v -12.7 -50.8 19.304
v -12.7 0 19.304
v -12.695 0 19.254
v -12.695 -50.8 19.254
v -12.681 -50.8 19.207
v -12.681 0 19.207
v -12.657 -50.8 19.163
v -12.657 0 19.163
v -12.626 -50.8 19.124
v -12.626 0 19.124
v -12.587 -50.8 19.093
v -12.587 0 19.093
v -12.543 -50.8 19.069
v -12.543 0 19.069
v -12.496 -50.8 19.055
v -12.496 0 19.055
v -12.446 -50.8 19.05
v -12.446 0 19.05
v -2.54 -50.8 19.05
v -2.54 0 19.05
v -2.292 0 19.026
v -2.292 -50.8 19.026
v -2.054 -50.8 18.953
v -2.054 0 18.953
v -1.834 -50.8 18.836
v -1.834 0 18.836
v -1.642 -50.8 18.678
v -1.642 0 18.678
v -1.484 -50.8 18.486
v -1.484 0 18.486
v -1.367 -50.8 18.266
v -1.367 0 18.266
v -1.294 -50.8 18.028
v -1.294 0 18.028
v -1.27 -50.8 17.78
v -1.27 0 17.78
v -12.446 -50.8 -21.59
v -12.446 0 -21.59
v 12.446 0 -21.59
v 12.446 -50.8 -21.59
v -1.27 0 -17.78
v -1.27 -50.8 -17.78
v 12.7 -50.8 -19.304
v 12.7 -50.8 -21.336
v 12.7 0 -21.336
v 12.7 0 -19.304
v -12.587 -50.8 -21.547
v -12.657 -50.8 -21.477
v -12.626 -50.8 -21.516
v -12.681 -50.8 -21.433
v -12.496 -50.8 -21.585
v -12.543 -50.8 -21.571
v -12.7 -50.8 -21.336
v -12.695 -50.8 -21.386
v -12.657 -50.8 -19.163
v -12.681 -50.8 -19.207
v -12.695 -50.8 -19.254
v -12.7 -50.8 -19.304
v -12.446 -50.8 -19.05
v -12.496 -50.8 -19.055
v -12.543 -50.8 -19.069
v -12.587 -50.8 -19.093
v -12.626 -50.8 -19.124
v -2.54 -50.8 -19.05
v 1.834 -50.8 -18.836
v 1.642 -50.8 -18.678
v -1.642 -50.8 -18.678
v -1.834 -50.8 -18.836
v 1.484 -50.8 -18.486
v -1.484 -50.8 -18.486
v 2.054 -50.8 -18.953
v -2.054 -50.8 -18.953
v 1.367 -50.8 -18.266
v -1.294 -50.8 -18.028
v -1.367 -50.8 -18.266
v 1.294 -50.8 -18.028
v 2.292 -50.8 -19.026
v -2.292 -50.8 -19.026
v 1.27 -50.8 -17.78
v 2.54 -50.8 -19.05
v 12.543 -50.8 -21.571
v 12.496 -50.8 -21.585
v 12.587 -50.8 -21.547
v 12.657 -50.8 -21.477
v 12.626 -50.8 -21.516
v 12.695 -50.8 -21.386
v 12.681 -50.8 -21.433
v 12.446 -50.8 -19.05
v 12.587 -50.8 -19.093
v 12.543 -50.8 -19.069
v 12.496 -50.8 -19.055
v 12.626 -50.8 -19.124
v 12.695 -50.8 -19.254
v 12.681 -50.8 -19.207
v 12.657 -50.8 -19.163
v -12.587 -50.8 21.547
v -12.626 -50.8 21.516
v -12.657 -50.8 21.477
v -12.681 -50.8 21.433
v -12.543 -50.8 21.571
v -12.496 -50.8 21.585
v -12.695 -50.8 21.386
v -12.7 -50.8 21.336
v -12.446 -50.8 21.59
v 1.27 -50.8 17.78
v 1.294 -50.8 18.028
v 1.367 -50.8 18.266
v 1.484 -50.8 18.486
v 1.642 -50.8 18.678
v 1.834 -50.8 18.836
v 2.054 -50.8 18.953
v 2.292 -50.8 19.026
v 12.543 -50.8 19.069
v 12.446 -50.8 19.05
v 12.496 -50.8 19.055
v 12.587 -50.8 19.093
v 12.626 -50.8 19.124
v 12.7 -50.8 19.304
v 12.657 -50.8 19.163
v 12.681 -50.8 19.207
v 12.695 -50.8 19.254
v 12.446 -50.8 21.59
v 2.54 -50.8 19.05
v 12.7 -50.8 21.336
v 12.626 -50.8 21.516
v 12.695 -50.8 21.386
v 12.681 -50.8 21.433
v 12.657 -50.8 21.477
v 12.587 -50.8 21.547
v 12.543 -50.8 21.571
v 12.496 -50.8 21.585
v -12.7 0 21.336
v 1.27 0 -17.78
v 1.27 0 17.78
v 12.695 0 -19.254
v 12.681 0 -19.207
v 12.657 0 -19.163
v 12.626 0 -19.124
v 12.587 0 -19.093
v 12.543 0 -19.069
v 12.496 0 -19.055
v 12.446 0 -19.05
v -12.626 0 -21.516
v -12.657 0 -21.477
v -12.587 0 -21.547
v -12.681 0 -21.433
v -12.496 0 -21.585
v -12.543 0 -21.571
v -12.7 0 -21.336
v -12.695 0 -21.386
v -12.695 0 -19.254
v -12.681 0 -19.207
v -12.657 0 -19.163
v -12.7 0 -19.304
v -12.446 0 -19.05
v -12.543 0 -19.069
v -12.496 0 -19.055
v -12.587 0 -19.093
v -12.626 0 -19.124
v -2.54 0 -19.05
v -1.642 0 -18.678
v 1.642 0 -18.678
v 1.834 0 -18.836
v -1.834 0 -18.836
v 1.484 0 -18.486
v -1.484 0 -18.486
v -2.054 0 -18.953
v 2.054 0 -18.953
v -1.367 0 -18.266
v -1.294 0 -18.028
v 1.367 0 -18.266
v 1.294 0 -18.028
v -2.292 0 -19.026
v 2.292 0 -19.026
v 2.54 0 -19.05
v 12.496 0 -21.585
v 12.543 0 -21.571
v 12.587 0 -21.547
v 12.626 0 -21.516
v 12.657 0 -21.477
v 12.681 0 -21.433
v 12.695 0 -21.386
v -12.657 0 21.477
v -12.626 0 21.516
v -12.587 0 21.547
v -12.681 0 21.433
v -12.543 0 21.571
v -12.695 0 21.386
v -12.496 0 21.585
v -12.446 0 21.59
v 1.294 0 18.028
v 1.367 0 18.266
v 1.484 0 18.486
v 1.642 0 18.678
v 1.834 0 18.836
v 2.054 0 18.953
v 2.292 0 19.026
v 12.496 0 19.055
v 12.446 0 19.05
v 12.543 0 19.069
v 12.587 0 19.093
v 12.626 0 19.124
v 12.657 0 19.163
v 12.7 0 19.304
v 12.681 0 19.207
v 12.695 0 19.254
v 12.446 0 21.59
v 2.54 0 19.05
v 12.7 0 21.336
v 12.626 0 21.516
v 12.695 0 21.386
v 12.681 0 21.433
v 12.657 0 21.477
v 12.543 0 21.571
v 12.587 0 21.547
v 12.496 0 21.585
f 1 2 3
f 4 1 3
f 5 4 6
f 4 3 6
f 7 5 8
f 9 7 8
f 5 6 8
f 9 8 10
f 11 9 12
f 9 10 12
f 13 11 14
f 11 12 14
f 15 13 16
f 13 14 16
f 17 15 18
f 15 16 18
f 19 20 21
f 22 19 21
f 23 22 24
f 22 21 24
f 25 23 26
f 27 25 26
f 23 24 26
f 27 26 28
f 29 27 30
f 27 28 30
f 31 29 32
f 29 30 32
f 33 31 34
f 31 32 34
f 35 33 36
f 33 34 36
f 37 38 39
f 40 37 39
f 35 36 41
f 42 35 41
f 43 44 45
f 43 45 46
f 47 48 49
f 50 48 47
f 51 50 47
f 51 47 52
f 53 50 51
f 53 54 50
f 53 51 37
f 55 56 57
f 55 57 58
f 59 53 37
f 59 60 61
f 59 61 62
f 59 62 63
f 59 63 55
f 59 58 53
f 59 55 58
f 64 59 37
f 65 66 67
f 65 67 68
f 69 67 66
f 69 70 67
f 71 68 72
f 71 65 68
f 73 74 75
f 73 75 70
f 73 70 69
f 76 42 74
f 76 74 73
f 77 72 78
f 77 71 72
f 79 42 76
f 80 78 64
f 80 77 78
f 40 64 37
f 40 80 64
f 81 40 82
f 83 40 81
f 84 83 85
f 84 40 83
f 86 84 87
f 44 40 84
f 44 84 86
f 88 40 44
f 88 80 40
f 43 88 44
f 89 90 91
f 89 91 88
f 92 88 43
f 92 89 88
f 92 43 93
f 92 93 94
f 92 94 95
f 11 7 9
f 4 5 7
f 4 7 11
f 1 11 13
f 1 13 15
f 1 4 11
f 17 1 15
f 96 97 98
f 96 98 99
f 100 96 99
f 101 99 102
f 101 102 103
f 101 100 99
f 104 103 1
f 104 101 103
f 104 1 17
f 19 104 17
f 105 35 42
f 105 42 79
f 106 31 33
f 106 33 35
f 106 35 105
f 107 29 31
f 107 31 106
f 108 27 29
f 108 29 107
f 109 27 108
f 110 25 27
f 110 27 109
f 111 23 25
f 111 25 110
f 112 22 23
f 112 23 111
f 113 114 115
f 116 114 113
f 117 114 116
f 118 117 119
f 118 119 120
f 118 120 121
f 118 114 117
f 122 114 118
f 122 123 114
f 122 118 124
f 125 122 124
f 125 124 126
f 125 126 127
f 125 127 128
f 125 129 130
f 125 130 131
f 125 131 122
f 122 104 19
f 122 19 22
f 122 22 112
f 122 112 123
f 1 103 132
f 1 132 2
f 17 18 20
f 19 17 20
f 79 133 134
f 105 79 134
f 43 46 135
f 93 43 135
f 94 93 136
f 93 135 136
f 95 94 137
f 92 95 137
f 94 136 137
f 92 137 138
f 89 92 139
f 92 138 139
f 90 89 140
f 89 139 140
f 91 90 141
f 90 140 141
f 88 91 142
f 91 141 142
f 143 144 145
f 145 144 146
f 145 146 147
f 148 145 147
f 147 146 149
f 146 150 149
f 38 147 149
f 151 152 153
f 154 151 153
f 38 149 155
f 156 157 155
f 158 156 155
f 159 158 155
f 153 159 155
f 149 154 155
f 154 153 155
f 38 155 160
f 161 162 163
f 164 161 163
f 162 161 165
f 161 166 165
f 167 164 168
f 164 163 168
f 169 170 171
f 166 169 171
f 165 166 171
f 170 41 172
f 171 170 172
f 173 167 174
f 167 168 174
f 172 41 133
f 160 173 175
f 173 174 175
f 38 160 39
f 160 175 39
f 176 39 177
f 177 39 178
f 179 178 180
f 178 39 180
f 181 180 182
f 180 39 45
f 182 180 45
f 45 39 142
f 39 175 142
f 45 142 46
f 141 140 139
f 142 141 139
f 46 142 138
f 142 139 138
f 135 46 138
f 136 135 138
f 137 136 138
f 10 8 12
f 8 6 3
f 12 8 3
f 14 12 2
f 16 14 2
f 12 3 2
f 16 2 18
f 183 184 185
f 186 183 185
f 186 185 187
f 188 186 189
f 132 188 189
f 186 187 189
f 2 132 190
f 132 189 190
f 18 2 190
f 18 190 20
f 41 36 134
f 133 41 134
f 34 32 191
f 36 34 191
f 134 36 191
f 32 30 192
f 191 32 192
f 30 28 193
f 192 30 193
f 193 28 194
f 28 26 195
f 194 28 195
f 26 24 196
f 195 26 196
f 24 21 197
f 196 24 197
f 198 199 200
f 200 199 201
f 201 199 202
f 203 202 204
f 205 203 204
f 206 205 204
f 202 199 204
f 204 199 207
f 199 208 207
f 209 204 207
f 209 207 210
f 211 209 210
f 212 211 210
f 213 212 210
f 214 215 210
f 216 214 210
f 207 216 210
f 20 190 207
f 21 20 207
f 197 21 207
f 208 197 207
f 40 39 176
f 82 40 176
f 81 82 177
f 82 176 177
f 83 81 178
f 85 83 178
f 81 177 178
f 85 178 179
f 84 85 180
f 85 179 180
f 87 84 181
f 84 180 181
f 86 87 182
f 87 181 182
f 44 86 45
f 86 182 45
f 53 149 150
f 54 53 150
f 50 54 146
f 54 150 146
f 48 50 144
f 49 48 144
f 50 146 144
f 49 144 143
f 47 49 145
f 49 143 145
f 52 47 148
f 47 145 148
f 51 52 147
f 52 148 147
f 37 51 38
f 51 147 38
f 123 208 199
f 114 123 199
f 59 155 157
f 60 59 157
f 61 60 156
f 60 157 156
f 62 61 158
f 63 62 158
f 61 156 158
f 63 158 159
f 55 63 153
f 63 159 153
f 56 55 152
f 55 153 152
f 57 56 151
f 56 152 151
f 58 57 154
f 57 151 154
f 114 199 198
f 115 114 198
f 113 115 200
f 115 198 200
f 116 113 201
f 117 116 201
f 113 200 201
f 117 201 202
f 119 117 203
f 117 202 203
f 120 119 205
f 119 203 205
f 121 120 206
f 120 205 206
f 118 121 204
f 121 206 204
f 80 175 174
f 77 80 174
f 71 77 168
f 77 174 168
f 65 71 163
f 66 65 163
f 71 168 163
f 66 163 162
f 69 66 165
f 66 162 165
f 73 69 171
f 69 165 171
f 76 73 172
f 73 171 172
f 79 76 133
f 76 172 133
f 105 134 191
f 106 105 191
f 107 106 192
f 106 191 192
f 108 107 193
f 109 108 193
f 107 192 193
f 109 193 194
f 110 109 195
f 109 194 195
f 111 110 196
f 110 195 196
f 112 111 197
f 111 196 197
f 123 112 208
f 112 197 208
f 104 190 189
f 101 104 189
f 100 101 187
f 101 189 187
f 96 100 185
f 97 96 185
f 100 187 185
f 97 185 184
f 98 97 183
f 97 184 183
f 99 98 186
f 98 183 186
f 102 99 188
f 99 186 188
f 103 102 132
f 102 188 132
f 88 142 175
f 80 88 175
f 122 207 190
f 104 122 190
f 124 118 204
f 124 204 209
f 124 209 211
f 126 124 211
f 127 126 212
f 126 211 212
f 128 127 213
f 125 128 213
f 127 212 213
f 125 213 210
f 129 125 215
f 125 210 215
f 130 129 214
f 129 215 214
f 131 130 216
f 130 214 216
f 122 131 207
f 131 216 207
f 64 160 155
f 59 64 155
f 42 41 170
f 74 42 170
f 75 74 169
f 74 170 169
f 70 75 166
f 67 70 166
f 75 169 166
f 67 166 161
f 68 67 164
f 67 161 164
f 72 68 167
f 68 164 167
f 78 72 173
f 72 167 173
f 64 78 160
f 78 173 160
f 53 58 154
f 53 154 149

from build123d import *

# Parameters (mm, degrees)
F1_DEPTH = 50.8


with BuildPart() as f1:
    # F0 (on Front) → F1 (new body)
    with BuildSketch(Plane.XZ):
        with BuildLine():
            ThreePointArc((-12.7, 19.304), (-12.625605, 19.124395), (-12.446, 19.05))
            Line((-12.446, 19.05), (-2.54, 19.05))
            ThreePointArc((-2.54, 19.05), (-1.641974, 18.678026), (-1.27, 17.78))
            Line((-1.27, 17.78), (-1.27, -17.78))
            ThreePointArc((-1.27, -17.78), (-1.641974, -18.678026), (-2.54, -19.05))
            Line((-2.54, -19.05), (-12.446, -19.05))
            ThreePointArc((-12.446, -19.05), (-12.625605, -19.124395), (-12.7, -19.304))
            Line((-12.7, -19.304), (-12.7, -21.336))
            ThreePointArc((-12.7, -21.336), (-12.625605, -21.515605), (-12.446, -21.59))
            Line((-12.446, -21.59), (12.446, -21.59))
            ThreePointArc((12.446, -21.59), (12.625605, -21.515605), (12.7, -21.336))
            Line((12.7, -21.336), (12.7, -19.304))
            ThreePointArc((12.7, -19.304), (12.625605, -19.124395), (12.446, -19.05))
            Line((12.446, -19.05), (2.54, -19.05))
            ThreePointArc((2.54, -19.05), (1.641974, -18.678026), (1.27, -17.78))
            Line((1.27, -17.78), (1.27, 17.78))
            ThreePointArc((1.27, 17.78), (1.641974, 18.678026), (2.54, 19.05))
            Line((2.54, 19.05), (12.446, 19.05))
            ThreePointArc((12.446, 19.05), (12.625605, 19.124395), (12.7, 19.304))
            Line((12.7, 19.304), (12.7, 21.336))
            ThreePointArc((12.7, 21.336), (12.625605, 21.515605), (12.446, 21.59))
            Line((12.446, 21.59), (-12.446, 21.59))
            ThreePointArc((-12.446, 21.59), (-12.625605, 21.515605), (-12.7, 21.336))
            Line((-12.7, 21.336), (-12.7, 19.304))
        make_face()
    extrude(amount=F1_DEPTH)


solid = f1.part
